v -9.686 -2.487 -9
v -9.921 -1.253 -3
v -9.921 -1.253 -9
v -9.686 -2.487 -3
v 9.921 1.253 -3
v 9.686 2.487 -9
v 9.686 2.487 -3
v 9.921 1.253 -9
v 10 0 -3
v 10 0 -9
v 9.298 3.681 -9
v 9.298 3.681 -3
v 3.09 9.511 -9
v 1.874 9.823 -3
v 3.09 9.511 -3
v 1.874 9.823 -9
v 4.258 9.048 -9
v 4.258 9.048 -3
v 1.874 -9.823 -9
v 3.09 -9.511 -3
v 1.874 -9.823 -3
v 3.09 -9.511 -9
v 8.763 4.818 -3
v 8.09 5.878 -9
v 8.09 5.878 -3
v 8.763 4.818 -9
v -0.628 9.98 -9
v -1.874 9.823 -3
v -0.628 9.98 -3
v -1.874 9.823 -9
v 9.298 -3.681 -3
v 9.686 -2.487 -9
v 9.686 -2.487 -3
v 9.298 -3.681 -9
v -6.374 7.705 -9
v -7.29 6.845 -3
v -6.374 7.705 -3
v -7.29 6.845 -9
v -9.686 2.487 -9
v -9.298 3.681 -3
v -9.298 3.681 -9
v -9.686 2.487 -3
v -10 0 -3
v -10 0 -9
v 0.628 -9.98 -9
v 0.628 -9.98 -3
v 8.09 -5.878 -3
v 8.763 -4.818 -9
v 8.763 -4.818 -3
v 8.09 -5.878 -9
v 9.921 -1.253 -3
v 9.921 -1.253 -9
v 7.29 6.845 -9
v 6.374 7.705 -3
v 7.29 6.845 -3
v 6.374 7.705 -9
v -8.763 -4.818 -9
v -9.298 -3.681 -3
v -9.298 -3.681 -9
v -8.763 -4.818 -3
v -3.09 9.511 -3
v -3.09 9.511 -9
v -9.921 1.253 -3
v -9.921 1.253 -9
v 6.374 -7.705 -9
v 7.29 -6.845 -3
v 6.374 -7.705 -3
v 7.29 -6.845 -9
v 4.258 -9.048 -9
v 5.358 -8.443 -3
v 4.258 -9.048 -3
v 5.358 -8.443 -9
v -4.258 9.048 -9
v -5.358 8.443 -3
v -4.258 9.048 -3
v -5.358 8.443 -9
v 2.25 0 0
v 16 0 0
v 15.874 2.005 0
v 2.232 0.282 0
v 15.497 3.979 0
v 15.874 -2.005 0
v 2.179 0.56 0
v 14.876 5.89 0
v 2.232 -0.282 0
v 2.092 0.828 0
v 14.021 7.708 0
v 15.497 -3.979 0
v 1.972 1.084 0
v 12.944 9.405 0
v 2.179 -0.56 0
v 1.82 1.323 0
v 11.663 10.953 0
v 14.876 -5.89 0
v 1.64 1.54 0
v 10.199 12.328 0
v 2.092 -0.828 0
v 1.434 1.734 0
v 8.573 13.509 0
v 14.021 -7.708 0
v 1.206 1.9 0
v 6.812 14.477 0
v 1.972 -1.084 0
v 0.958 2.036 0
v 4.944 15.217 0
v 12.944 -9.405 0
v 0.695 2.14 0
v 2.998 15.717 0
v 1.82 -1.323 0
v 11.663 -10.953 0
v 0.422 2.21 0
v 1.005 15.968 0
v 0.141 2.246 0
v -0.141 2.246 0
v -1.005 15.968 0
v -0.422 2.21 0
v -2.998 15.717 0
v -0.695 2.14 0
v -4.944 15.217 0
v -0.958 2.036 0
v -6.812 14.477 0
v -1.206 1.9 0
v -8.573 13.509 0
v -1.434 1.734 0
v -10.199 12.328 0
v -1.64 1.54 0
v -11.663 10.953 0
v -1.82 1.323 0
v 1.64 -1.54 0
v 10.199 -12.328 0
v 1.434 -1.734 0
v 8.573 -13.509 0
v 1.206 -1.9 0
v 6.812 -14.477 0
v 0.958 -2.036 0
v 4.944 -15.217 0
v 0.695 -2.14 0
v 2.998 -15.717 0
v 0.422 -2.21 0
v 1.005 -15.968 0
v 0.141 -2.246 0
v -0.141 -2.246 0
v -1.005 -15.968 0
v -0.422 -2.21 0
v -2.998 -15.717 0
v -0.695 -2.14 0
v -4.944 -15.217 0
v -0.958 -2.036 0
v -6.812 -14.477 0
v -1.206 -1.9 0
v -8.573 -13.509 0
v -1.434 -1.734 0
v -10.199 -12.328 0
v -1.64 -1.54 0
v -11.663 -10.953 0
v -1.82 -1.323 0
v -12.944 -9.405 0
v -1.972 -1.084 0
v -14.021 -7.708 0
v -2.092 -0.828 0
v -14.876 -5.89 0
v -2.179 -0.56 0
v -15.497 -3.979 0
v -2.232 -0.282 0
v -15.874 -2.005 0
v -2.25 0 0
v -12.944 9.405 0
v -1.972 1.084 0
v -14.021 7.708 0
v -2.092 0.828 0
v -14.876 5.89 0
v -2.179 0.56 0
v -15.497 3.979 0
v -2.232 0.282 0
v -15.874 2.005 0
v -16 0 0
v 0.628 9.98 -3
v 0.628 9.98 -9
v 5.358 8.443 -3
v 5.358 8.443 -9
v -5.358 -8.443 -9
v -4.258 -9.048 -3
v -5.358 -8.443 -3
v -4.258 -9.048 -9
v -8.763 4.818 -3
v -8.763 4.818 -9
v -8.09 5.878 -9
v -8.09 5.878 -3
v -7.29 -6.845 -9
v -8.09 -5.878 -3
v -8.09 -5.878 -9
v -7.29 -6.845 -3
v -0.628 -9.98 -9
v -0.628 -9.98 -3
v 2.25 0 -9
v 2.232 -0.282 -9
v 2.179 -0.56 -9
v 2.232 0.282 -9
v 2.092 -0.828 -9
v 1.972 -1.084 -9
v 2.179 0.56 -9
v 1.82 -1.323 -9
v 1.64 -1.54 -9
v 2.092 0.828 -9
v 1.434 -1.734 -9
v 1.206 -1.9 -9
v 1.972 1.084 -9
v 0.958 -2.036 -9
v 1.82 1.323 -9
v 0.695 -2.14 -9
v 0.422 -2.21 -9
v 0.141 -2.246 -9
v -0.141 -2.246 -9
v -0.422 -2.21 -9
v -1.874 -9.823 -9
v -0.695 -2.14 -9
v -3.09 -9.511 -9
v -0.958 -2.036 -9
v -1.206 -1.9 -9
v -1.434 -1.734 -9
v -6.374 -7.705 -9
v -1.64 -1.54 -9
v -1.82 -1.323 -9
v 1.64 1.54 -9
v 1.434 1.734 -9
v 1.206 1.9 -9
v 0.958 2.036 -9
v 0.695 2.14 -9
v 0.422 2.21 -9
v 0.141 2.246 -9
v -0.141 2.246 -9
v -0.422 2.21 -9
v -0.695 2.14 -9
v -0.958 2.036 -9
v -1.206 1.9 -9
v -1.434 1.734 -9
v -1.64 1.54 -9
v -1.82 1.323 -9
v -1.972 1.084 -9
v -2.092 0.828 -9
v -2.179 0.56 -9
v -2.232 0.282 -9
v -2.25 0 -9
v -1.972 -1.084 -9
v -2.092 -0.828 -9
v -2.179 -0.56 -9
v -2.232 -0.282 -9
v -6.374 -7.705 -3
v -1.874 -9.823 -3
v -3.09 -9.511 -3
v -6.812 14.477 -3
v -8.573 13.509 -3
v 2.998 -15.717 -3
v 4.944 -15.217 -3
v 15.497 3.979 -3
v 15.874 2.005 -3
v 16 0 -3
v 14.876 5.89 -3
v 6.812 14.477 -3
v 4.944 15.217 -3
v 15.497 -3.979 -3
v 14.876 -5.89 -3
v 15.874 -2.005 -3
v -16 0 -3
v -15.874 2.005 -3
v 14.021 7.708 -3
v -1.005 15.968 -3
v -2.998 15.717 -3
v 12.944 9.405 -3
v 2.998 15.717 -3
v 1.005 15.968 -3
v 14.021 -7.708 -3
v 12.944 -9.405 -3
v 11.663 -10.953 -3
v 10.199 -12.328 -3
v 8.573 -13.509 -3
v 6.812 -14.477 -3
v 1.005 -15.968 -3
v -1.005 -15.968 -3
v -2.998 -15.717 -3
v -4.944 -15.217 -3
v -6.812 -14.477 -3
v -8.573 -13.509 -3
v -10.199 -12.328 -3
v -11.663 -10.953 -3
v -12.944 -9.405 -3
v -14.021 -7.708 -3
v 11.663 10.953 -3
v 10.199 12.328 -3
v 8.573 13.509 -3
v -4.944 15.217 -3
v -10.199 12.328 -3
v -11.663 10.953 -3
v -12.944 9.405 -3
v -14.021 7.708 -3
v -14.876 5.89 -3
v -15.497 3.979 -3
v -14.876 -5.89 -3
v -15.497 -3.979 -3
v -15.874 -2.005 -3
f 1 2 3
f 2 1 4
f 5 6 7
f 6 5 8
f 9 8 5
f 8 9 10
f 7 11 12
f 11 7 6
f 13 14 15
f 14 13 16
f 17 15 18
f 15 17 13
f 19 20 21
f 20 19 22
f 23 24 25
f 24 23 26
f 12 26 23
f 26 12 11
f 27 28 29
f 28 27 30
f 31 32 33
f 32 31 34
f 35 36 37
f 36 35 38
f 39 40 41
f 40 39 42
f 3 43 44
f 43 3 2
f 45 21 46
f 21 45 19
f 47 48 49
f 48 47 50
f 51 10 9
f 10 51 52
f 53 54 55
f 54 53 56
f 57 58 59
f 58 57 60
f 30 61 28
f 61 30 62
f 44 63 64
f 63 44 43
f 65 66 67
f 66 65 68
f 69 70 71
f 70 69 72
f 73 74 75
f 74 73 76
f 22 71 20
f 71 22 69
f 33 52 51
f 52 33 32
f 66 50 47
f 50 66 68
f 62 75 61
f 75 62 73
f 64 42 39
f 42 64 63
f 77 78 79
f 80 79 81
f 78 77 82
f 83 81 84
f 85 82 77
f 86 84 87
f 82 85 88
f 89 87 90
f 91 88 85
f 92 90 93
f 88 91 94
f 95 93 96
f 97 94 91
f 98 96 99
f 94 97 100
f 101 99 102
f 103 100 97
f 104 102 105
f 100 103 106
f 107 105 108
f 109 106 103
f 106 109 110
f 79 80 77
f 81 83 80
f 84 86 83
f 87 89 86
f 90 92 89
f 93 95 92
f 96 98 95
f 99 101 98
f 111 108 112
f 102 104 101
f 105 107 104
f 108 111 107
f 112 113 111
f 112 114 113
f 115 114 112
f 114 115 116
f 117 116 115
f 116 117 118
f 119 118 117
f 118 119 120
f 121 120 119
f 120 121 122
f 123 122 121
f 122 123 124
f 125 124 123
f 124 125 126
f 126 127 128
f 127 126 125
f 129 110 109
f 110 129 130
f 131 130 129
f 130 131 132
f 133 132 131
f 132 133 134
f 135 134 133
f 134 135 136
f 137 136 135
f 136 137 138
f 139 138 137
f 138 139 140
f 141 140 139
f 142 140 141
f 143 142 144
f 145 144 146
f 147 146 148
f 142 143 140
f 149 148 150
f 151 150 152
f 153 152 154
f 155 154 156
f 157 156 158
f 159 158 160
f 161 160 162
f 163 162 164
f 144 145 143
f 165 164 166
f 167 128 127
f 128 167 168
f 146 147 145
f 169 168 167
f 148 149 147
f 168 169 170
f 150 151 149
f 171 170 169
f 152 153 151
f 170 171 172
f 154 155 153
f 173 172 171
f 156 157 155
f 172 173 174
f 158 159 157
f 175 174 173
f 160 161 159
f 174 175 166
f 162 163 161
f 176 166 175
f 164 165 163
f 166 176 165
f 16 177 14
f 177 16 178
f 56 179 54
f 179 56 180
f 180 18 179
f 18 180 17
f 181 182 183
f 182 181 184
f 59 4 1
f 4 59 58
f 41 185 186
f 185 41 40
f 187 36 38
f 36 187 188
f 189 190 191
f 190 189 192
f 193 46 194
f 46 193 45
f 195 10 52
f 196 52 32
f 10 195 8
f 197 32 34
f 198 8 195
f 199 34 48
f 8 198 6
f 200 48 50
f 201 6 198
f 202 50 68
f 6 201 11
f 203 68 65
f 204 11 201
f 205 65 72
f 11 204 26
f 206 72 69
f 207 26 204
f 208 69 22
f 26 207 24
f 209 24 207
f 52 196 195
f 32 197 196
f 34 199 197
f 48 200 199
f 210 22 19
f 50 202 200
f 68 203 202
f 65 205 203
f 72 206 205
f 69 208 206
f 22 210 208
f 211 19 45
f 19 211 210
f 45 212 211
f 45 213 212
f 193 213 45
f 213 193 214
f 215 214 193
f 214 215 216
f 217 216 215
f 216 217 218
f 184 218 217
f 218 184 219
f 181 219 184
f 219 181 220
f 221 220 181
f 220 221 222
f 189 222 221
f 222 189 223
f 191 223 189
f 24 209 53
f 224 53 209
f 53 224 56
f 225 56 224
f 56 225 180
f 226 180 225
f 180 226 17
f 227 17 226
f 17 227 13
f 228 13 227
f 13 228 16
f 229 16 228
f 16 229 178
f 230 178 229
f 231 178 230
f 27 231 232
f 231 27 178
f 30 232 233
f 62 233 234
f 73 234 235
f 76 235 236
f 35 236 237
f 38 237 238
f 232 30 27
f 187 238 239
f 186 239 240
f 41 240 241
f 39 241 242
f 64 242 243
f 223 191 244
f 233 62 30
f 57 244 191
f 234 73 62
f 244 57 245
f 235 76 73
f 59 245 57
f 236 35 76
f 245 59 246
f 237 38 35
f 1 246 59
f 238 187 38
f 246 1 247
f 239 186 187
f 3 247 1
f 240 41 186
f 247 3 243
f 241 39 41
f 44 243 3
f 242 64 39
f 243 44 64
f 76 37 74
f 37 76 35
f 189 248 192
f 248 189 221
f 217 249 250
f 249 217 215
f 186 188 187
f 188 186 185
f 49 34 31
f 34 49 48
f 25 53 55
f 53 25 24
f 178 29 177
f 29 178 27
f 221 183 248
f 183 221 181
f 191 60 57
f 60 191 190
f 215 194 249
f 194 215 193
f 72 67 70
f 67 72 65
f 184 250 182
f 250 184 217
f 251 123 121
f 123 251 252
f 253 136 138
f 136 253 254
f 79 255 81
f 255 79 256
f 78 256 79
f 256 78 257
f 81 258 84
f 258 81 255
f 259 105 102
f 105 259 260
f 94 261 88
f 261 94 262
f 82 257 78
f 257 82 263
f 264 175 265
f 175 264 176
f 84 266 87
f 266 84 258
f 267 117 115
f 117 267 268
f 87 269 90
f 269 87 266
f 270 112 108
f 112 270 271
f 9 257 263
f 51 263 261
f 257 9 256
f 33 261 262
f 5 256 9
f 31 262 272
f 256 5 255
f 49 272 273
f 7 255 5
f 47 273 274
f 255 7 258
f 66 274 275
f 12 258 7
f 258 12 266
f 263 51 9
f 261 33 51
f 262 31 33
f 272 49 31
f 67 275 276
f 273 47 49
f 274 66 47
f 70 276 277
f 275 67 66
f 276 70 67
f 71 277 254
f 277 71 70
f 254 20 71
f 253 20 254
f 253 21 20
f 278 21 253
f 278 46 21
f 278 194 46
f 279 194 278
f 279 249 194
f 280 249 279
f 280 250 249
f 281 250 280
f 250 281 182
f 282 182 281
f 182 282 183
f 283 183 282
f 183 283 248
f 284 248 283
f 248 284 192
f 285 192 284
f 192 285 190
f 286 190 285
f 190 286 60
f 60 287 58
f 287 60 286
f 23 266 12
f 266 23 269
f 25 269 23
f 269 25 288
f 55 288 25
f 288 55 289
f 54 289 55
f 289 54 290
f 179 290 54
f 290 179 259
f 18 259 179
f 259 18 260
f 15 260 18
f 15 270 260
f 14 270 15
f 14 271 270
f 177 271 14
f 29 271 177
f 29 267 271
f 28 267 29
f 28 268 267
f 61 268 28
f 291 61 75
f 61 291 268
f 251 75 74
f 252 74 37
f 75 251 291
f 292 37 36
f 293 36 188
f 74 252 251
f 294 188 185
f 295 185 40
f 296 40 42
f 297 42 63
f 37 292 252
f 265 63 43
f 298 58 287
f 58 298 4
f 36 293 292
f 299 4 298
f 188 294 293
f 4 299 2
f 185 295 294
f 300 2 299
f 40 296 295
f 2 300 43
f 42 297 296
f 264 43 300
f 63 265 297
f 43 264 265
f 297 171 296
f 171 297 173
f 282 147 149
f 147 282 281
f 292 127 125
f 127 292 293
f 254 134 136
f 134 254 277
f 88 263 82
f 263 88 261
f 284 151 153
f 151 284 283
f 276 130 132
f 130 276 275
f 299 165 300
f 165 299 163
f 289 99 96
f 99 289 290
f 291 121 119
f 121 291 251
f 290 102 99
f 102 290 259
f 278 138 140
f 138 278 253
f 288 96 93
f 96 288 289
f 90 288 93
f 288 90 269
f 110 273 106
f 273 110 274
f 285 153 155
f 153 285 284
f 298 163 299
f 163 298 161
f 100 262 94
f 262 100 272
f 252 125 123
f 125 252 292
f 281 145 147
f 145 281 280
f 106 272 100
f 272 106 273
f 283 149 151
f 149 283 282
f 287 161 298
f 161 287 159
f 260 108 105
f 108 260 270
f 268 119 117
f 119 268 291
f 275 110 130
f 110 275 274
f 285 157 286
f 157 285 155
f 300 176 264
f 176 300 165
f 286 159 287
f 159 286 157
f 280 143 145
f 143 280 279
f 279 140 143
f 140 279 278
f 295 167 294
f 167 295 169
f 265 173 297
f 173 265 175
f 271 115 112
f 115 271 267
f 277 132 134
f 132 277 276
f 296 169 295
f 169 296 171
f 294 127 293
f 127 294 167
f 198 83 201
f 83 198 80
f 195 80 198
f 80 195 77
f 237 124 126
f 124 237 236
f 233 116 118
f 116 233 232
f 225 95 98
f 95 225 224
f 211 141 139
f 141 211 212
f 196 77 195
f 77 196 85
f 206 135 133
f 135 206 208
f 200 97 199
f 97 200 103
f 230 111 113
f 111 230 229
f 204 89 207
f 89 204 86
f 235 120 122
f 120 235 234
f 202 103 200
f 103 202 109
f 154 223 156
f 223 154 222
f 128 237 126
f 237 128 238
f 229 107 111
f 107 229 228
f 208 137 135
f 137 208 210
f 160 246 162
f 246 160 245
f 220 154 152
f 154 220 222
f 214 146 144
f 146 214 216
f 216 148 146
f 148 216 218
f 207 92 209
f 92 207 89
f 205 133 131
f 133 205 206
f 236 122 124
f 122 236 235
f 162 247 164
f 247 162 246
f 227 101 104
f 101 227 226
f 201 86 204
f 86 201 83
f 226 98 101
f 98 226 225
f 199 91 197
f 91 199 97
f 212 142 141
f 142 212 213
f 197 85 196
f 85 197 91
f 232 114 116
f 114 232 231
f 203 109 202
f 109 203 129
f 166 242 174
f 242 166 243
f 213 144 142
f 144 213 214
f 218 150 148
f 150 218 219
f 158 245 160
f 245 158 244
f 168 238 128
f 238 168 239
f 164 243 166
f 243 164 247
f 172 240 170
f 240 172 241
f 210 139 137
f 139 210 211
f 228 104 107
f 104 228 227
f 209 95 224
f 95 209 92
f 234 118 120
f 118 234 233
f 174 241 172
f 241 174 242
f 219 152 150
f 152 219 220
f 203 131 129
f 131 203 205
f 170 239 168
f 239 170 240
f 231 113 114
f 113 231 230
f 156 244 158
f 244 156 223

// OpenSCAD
$fn = 50;


difference() {
	union() {
		translate(v = [0, 0, -9.0000000000]) {
			cylinder(h = 9, r = 10.0000000000);
		}
		translate(v = [0, 0, -3.0000000000]) {
			cylinder(h = 3, r = 16.0000000000);
		}
	}
	union() {
		#translate(v = [0, 0, -9]) {
			cylinder(h = 9, r = 2.2500000000);
		}
	}
}
